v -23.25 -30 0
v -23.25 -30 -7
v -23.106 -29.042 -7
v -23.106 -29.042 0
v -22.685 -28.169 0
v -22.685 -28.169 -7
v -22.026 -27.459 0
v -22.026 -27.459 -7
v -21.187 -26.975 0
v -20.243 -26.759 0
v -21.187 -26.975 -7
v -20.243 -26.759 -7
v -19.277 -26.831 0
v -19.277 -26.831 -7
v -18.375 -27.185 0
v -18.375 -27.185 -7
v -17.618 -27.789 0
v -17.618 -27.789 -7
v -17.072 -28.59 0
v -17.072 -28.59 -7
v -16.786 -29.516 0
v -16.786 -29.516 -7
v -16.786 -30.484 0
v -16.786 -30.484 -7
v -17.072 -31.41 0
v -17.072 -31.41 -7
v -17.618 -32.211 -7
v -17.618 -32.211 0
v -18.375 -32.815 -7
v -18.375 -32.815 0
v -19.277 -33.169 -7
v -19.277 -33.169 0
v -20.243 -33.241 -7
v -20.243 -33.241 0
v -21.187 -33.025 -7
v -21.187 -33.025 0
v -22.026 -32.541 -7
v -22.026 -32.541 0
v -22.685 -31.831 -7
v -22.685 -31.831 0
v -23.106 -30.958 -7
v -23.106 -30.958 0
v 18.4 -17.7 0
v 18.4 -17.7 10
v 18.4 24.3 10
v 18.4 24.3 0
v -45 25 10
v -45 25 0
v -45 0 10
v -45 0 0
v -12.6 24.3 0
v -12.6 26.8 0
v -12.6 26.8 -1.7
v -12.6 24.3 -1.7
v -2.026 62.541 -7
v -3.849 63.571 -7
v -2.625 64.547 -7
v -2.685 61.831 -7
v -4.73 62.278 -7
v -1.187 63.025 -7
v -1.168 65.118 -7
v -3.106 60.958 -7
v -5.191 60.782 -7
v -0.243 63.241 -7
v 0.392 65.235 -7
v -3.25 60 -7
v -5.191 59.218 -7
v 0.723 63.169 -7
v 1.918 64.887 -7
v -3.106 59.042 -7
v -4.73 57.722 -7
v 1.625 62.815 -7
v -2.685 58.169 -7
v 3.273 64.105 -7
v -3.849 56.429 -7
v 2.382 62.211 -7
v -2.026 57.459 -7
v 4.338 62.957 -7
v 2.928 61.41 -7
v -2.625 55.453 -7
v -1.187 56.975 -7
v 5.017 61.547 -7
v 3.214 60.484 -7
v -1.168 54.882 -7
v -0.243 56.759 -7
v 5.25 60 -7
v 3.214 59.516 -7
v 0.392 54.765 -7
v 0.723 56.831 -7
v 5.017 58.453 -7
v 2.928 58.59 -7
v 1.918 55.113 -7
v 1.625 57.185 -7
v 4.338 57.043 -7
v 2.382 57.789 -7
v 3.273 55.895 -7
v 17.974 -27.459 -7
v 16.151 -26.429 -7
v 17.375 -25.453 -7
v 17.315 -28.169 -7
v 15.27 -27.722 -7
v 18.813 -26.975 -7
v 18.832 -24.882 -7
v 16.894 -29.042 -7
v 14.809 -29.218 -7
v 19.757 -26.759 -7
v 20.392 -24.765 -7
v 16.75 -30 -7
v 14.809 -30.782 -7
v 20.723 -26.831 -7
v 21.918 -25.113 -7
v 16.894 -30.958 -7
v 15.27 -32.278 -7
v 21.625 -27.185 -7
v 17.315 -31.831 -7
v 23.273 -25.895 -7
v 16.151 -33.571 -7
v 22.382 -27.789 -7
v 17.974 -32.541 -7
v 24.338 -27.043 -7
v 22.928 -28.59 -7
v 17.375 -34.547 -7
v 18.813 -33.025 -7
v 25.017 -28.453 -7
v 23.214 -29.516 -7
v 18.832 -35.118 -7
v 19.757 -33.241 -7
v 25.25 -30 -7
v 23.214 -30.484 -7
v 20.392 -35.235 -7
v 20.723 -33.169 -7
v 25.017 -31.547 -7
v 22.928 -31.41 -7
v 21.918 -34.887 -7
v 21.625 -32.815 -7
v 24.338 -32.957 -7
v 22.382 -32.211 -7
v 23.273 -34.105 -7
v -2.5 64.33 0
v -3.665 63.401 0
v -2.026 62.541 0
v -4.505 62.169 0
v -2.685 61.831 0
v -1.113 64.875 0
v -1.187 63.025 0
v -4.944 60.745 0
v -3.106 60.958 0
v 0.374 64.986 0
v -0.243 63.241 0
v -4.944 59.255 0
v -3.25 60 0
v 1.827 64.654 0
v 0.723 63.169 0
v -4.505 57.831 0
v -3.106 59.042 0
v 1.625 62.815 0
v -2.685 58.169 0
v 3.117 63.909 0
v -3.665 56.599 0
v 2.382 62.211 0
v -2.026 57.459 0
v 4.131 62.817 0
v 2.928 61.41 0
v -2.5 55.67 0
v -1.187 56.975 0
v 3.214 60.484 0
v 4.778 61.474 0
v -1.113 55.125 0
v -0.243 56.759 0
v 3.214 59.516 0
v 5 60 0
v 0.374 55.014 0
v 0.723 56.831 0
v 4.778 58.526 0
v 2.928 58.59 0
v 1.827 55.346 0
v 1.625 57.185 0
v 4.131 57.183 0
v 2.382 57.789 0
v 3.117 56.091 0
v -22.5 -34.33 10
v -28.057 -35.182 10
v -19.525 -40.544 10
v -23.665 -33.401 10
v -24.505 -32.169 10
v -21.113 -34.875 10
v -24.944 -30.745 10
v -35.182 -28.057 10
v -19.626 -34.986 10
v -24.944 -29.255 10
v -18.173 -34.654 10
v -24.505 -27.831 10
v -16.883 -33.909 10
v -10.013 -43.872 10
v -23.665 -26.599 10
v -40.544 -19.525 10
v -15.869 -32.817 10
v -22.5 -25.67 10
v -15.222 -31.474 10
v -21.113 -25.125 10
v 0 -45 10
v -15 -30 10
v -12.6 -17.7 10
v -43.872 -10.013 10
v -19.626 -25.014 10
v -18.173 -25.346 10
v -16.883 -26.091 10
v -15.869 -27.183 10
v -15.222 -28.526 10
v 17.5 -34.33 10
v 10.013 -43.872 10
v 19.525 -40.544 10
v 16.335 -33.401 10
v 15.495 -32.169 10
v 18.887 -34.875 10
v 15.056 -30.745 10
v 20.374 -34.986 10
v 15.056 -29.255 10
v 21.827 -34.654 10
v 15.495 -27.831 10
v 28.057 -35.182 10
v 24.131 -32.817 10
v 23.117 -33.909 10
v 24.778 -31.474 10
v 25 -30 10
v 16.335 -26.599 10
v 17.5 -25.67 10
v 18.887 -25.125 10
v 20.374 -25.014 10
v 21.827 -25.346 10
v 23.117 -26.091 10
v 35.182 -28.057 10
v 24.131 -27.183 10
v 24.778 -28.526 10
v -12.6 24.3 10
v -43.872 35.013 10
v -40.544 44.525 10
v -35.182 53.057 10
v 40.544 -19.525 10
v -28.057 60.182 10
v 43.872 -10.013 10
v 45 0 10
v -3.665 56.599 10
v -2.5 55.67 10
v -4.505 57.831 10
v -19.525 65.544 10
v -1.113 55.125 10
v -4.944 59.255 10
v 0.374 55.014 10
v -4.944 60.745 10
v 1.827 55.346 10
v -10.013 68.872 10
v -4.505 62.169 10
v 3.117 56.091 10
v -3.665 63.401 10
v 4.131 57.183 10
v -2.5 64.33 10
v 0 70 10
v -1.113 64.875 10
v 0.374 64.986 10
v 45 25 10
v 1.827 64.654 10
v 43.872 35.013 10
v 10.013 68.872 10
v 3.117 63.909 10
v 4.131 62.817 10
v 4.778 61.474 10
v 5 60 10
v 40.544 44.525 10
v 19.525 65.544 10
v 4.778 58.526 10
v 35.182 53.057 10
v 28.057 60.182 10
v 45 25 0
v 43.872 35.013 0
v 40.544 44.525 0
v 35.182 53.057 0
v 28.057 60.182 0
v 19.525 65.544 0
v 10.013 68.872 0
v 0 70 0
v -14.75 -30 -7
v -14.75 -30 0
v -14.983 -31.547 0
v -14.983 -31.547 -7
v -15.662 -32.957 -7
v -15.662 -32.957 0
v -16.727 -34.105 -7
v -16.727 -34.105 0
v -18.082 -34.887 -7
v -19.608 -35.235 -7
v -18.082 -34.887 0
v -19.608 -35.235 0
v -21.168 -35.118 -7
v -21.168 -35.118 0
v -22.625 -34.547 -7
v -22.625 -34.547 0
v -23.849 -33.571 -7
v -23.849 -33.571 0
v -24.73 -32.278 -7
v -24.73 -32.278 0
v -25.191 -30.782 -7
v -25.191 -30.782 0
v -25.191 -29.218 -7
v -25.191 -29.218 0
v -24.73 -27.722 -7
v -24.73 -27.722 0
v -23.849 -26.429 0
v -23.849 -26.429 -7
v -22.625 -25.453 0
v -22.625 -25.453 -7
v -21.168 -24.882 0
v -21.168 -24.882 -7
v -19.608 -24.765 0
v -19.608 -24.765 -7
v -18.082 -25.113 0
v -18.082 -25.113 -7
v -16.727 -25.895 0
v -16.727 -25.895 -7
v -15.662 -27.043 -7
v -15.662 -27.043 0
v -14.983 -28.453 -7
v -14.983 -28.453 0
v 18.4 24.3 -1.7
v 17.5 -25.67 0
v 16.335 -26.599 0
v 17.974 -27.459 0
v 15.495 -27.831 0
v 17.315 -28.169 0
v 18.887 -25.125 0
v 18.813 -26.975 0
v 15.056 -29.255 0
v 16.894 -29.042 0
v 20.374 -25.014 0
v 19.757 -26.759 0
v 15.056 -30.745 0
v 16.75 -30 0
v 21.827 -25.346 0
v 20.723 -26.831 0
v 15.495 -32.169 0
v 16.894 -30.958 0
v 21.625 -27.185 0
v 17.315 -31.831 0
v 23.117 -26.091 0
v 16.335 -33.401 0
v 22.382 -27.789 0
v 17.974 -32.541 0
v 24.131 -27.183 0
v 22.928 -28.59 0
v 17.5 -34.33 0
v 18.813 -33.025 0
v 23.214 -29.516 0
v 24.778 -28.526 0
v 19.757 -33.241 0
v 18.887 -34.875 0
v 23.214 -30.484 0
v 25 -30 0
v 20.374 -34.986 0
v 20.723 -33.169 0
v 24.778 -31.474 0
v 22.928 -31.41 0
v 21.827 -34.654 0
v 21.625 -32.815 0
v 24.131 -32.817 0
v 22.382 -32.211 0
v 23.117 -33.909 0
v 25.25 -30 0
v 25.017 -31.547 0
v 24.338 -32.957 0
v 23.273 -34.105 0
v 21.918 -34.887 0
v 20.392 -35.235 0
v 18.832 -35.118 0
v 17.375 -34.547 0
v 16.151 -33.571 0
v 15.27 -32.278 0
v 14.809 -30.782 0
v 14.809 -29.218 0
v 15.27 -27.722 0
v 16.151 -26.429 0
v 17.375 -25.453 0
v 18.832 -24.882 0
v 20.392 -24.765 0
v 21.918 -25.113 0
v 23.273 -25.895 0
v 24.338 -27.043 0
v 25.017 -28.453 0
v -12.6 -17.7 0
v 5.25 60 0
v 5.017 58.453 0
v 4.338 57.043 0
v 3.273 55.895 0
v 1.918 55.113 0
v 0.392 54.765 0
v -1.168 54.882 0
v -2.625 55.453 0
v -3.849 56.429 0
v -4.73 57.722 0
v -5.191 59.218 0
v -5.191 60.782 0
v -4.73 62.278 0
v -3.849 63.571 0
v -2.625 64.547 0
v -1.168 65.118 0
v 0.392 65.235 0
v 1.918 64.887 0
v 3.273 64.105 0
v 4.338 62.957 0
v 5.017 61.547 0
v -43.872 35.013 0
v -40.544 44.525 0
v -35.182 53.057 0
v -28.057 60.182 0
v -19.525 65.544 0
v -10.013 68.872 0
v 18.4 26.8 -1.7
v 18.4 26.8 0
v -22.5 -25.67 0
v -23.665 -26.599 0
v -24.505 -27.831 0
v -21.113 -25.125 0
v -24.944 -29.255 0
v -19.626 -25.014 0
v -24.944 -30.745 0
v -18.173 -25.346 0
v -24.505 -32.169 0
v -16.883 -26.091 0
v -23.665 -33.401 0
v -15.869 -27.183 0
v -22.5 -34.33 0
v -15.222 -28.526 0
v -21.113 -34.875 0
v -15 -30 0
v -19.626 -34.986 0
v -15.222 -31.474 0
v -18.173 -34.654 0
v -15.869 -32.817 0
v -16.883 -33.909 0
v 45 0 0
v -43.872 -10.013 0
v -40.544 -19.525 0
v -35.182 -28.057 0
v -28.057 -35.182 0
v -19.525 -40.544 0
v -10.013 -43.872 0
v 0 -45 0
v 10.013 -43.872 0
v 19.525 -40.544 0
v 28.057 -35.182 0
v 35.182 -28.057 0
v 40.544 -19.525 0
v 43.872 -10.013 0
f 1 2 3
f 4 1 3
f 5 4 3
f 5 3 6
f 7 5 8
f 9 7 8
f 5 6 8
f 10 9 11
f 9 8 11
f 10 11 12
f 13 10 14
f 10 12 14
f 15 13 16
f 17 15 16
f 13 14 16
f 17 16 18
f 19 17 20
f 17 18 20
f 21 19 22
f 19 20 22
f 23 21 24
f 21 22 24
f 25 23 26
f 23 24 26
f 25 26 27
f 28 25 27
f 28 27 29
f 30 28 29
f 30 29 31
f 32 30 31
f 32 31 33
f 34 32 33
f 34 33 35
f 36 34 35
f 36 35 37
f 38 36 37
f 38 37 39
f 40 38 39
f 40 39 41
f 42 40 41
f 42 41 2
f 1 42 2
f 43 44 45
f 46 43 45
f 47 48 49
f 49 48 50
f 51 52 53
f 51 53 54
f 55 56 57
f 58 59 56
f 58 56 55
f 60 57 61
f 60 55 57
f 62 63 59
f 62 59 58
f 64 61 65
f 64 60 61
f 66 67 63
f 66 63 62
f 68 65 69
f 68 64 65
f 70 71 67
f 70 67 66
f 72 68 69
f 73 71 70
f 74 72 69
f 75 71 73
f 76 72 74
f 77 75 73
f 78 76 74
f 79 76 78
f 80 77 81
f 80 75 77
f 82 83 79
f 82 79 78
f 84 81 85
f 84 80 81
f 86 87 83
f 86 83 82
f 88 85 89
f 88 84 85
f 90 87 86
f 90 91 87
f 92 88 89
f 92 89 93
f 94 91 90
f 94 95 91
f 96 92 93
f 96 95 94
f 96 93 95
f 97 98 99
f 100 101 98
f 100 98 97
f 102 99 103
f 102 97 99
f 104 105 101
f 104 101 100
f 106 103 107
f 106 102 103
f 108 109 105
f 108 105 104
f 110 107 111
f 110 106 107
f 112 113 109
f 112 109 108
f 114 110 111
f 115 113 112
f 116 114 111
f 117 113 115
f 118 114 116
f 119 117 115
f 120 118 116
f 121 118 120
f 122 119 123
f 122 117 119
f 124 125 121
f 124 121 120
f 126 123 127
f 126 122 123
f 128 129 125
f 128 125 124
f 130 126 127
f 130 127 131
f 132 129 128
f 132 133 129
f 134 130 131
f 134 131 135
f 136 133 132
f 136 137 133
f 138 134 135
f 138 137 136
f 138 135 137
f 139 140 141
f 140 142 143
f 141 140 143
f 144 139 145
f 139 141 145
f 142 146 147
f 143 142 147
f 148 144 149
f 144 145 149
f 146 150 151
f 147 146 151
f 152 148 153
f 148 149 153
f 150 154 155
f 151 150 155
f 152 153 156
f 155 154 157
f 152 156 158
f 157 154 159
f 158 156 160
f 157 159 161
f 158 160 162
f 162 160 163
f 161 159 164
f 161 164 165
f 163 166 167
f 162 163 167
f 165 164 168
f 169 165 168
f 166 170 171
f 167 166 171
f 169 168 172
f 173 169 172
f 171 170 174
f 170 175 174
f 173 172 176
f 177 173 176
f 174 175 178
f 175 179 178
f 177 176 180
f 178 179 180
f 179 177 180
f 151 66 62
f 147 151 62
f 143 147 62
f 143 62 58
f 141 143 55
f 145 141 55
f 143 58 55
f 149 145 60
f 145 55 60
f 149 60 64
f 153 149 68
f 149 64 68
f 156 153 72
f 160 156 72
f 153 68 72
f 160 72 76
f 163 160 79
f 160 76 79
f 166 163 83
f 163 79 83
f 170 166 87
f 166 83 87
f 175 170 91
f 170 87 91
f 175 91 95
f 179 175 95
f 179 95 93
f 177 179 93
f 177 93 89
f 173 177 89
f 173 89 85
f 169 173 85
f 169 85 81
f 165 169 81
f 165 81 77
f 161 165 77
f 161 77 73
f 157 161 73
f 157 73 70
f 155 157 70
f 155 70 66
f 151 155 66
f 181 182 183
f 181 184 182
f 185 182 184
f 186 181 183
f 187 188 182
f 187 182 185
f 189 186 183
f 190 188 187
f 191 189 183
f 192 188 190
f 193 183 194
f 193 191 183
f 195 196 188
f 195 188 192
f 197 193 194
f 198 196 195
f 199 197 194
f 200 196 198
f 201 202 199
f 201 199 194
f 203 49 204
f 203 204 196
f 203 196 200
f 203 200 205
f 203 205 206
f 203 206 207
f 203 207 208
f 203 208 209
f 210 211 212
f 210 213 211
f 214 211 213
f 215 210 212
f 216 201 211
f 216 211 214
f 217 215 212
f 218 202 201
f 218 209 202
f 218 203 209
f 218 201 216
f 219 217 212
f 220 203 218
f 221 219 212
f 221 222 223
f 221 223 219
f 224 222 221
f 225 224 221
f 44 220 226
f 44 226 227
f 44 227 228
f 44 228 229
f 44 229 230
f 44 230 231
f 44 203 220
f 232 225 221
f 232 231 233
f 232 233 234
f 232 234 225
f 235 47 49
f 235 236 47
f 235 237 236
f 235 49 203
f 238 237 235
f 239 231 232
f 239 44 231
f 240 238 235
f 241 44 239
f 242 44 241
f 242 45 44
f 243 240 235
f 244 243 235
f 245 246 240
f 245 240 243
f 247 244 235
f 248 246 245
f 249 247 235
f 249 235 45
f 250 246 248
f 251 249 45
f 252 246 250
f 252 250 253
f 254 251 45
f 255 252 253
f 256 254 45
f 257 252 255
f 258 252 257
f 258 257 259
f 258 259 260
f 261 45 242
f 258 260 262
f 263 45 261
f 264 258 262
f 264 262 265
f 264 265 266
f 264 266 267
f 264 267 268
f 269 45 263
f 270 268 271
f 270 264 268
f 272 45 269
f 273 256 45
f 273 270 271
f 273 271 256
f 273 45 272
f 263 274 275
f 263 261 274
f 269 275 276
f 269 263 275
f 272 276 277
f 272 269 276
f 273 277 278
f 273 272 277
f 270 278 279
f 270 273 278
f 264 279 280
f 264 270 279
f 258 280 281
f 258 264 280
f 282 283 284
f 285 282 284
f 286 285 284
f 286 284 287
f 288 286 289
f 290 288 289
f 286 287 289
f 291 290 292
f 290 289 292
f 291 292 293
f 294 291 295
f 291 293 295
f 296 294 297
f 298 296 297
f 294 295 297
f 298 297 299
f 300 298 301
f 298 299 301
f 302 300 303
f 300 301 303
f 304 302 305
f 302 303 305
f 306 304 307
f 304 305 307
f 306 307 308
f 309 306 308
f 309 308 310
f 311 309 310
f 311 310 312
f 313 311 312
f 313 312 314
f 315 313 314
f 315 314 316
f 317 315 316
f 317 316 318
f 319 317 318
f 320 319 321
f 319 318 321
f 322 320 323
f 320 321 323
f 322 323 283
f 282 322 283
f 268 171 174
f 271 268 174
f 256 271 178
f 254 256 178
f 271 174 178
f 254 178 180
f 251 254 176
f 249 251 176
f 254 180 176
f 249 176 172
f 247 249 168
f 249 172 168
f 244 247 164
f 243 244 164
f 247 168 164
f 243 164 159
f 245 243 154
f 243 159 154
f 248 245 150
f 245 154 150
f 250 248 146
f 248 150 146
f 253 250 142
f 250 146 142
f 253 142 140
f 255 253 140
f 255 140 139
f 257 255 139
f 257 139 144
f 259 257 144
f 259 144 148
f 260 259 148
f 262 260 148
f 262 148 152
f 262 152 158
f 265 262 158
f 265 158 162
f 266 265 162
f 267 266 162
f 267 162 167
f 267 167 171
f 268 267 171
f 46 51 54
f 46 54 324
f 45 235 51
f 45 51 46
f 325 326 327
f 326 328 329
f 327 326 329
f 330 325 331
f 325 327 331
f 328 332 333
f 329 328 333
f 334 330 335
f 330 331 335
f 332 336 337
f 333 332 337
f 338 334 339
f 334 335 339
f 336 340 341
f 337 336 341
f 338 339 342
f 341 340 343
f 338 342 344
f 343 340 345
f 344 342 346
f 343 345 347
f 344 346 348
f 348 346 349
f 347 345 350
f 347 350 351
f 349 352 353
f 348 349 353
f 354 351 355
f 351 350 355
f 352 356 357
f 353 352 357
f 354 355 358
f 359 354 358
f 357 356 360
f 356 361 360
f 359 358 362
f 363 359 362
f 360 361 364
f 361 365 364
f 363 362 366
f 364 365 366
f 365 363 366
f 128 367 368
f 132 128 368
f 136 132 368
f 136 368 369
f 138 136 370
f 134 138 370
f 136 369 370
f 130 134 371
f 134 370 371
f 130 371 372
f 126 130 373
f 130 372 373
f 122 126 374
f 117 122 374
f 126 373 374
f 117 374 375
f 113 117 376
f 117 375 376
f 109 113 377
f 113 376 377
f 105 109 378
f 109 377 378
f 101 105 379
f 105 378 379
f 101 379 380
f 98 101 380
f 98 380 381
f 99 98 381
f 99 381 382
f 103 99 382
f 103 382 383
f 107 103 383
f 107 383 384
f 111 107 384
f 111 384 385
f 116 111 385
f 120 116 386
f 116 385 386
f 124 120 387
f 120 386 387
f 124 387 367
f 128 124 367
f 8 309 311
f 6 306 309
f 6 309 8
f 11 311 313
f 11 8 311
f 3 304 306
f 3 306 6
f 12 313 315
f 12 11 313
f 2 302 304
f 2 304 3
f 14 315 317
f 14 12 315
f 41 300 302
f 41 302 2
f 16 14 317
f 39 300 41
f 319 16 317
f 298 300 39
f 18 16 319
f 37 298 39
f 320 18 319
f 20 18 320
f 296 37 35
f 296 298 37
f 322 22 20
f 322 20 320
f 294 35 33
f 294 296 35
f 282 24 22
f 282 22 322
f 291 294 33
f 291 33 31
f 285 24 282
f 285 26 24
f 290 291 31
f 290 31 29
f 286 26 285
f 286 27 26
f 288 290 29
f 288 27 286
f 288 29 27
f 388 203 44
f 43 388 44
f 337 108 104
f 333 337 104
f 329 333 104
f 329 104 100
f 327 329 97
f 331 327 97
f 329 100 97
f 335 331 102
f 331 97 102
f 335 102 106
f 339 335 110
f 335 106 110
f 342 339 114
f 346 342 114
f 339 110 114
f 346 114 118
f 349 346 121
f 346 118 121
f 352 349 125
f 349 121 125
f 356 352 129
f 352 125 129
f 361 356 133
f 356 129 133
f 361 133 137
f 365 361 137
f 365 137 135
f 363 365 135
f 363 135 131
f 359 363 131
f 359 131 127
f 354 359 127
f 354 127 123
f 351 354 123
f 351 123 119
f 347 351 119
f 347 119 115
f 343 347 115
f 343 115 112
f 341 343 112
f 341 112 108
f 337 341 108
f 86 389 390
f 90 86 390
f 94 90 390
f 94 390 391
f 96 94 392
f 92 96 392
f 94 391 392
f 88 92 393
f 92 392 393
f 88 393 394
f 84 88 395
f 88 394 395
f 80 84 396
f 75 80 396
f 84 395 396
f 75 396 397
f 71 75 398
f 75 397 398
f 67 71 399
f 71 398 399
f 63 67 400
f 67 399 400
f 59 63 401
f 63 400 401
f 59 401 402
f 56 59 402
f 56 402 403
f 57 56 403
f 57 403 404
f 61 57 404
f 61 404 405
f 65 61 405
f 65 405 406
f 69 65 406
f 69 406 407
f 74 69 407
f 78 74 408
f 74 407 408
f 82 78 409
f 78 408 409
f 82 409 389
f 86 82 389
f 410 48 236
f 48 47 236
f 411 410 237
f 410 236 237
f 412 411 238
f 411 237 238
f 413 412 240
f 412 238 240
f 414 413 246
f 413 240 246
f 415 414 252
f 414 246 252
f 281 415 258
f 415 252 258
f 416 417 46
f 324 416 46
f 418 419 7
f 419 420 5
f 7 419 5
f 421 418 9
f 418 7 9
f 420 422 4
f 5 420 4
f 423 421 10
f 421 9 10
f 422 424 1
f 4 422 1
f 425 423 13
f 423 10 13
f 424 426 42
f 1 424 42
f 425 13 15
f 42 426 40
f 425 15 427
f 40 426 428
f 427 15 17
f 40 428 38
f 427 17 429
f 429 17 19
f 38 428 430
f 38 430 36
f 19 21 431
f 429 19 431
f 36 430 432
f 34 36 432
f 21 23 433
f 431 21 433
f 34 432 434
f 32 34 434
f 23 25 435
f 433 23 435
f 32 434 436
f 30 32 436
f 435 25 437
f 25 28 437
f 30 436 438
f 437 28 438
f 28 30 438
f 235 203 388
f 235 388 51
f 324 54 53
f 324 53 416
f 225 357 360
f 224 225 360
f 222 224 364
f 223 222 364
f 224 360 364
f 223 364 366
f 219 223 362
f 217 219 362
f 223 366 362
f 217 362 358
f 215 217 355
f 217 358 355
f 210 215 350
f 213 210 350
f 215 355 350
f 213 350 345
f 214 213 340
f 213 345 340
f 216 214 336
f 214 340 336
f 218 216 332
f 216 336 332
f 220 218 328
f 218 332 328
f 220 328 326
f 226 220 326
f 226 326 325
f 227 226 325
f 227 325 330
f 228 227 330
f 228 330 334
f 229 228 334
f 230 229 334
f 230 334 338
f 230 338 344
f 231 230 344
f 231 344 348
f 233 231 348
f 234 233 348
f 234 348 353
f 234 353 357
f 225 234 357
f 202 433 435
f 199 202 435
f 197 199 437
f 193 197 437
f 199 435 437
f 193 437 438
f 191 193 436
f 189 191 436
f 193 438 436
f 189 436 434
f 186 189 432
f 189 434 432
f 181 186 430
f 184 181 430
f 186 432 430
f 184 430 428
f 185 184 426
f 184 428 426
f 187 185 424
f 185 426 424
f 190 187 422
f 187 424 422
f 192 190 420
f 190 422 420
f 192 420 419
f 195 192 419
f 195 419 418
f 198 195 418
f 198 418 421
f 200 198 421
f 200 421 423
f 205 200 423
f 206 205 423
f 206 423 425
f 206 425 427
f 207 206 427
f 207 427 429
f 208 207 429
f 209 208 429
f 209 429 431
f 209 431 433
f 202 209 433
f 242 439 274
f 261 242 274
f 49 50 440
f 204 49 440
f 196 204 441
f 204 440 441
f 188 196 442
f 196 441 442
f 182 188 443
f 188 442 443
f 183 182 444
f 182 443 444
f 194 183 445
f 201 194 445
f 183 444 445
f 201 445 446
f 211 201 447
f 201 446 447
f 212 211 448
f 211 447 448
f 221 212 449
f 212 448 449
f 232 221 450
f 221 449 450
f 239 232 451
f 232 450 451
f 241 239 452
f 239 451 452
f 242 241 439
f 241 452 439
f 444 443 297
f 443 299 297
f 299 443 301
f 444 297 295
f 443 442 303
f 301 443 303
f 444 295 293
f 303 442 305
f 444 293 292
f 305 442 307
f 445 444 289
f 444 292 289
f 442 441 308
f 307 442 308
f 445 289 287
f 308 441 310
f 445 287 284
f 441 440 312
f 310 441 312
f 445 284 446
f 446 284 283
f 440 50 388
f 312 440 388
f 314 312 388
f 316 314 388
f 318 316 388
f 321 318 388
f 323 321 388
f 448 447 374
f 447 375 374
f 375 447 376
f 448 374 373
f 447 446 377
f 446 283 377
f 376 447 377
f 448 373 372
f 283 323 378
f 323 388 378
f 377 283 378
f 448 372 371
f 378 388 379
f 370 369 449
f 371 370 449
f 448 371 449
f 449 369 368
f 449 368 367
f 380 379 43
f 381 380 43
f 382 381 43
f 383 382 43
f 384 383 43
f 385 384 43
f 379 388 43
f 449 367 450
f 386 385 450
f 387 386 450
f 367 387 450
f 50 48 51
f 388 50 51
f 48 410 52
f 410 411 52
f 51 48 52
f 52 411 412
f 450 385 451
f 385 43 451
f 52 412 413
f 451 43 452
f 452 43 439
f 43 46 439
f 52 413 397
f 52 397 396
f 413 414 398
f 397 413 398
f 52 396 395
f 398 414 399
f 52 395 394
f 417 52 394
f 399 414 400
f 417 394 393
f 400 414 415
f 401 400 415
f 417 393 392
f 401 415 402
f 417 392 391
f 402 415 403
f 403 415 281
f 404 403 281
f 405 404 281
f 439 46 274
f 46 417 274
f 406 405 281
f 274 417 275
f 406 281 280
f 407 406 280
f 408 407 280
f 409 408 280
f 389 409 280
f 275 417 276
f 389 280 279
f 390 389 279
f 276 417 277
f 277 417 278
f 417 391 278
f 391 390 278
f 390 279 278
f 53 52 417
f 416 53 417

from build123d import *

# Parameters (mm, degrees)
F1_DEPTH    = 10
F3_R        = 44.99999
F4_W        = 31
F4_H        = 42
F5_DEPTH    = 11
F6_R        = 5.25
F7_DEPTH    = 7
F9_D        = 10
F9_DEPTH    = 10.001
F10_D       = 6.5
F10_ON_F6_D = 6.5
F11_W       = 31
F11_H       = 2.5
F12_DEPTH   = 1.7


# Not quite as in the source:
# - a fillet or chamfer is up to 0.001 mm smaller than in the source, because OpenCascade refuses the exact size


with BuildPart() as f1:
    # F0 (on Top) → F1 (new body)
    with BuildSketch(Plane.XY):
        with BuildLine():
            Line((-45, 70), (-45, 0))
            ThreePointArc((-45, 0), (0, -45), (45, 0))
            Line((45, 0), (45, 70))
            Line((45, 70), (-45, 70))
        make_face()
    extrude(amount=F1_DEPTH)

    # F3 (radius 45 in the source; OpenCascade refuses exactly that, so slightly less here)
    f3_edges = [f1.edges().sort_by_distance(p)[0] for p in [
        (-45, 70, 5),
        (45, 70, 5),
    ]]
    fillet(f3_edges, radius=F3_R)

    # F4 (on face) → F5 (cut)
    with BuildSketch(Plane.XY.offset(10)):
        with Locations((2.9, 3.3)):
            Rectangle(F4_W, F4_H)
    extrude(amount=-F5_DEPTH, mode=Mode.SUBTRACT)

    # F6 (on face) → F7 (join)
    with BuildSketch(Plane(origin=(0, 0, 0), x_dir=(1, 0, 0), z_dir=(0, 0, -1))):
        with Locations((0, -60)):
            Circle(F6_R)
        with Locations((-20, 30)):
            Circle(F6_R)
        with Locations((20, 30)):
            Circle(F6_R)
    extrude(amount=F7_DEPTH)

    # F9 (through all, one way)
    with BuildSketch(Plane(origin=(0, 0, 0), x_dir=(1, 0, 0), z_dir=(0, 0, -1))):
        with Locations((-20, 30), (20, 30), (0, -60)):
            Circle(F9_D / 2)
    extrude(amount=-F9_DEPTH, mode=Mode.SUBTRACT)

    # F10 (through all)
    with Locations(Plane.XY):
        with Locations((20, -30), (0, 60)):
            Hole(F10_D / 2)

    # F10 on F6 (through all)
    with Locations(Plane.XY):
        with Locations((-20, -30)):
            Hole(F10_ON_F6_D / 2)

    # F11 (on face) → F12 (join)
    with BuildSketch(Plane(origin=(0, 0, 0), x_dir=(1, 0, 0), z_dir=(0, 0, -1))):
        with Locations((2.9, -25.55)):
            Rectangle(F11_W, F11_H)
    extrude(amount=F12_DEPTH)


solid = f1.part
